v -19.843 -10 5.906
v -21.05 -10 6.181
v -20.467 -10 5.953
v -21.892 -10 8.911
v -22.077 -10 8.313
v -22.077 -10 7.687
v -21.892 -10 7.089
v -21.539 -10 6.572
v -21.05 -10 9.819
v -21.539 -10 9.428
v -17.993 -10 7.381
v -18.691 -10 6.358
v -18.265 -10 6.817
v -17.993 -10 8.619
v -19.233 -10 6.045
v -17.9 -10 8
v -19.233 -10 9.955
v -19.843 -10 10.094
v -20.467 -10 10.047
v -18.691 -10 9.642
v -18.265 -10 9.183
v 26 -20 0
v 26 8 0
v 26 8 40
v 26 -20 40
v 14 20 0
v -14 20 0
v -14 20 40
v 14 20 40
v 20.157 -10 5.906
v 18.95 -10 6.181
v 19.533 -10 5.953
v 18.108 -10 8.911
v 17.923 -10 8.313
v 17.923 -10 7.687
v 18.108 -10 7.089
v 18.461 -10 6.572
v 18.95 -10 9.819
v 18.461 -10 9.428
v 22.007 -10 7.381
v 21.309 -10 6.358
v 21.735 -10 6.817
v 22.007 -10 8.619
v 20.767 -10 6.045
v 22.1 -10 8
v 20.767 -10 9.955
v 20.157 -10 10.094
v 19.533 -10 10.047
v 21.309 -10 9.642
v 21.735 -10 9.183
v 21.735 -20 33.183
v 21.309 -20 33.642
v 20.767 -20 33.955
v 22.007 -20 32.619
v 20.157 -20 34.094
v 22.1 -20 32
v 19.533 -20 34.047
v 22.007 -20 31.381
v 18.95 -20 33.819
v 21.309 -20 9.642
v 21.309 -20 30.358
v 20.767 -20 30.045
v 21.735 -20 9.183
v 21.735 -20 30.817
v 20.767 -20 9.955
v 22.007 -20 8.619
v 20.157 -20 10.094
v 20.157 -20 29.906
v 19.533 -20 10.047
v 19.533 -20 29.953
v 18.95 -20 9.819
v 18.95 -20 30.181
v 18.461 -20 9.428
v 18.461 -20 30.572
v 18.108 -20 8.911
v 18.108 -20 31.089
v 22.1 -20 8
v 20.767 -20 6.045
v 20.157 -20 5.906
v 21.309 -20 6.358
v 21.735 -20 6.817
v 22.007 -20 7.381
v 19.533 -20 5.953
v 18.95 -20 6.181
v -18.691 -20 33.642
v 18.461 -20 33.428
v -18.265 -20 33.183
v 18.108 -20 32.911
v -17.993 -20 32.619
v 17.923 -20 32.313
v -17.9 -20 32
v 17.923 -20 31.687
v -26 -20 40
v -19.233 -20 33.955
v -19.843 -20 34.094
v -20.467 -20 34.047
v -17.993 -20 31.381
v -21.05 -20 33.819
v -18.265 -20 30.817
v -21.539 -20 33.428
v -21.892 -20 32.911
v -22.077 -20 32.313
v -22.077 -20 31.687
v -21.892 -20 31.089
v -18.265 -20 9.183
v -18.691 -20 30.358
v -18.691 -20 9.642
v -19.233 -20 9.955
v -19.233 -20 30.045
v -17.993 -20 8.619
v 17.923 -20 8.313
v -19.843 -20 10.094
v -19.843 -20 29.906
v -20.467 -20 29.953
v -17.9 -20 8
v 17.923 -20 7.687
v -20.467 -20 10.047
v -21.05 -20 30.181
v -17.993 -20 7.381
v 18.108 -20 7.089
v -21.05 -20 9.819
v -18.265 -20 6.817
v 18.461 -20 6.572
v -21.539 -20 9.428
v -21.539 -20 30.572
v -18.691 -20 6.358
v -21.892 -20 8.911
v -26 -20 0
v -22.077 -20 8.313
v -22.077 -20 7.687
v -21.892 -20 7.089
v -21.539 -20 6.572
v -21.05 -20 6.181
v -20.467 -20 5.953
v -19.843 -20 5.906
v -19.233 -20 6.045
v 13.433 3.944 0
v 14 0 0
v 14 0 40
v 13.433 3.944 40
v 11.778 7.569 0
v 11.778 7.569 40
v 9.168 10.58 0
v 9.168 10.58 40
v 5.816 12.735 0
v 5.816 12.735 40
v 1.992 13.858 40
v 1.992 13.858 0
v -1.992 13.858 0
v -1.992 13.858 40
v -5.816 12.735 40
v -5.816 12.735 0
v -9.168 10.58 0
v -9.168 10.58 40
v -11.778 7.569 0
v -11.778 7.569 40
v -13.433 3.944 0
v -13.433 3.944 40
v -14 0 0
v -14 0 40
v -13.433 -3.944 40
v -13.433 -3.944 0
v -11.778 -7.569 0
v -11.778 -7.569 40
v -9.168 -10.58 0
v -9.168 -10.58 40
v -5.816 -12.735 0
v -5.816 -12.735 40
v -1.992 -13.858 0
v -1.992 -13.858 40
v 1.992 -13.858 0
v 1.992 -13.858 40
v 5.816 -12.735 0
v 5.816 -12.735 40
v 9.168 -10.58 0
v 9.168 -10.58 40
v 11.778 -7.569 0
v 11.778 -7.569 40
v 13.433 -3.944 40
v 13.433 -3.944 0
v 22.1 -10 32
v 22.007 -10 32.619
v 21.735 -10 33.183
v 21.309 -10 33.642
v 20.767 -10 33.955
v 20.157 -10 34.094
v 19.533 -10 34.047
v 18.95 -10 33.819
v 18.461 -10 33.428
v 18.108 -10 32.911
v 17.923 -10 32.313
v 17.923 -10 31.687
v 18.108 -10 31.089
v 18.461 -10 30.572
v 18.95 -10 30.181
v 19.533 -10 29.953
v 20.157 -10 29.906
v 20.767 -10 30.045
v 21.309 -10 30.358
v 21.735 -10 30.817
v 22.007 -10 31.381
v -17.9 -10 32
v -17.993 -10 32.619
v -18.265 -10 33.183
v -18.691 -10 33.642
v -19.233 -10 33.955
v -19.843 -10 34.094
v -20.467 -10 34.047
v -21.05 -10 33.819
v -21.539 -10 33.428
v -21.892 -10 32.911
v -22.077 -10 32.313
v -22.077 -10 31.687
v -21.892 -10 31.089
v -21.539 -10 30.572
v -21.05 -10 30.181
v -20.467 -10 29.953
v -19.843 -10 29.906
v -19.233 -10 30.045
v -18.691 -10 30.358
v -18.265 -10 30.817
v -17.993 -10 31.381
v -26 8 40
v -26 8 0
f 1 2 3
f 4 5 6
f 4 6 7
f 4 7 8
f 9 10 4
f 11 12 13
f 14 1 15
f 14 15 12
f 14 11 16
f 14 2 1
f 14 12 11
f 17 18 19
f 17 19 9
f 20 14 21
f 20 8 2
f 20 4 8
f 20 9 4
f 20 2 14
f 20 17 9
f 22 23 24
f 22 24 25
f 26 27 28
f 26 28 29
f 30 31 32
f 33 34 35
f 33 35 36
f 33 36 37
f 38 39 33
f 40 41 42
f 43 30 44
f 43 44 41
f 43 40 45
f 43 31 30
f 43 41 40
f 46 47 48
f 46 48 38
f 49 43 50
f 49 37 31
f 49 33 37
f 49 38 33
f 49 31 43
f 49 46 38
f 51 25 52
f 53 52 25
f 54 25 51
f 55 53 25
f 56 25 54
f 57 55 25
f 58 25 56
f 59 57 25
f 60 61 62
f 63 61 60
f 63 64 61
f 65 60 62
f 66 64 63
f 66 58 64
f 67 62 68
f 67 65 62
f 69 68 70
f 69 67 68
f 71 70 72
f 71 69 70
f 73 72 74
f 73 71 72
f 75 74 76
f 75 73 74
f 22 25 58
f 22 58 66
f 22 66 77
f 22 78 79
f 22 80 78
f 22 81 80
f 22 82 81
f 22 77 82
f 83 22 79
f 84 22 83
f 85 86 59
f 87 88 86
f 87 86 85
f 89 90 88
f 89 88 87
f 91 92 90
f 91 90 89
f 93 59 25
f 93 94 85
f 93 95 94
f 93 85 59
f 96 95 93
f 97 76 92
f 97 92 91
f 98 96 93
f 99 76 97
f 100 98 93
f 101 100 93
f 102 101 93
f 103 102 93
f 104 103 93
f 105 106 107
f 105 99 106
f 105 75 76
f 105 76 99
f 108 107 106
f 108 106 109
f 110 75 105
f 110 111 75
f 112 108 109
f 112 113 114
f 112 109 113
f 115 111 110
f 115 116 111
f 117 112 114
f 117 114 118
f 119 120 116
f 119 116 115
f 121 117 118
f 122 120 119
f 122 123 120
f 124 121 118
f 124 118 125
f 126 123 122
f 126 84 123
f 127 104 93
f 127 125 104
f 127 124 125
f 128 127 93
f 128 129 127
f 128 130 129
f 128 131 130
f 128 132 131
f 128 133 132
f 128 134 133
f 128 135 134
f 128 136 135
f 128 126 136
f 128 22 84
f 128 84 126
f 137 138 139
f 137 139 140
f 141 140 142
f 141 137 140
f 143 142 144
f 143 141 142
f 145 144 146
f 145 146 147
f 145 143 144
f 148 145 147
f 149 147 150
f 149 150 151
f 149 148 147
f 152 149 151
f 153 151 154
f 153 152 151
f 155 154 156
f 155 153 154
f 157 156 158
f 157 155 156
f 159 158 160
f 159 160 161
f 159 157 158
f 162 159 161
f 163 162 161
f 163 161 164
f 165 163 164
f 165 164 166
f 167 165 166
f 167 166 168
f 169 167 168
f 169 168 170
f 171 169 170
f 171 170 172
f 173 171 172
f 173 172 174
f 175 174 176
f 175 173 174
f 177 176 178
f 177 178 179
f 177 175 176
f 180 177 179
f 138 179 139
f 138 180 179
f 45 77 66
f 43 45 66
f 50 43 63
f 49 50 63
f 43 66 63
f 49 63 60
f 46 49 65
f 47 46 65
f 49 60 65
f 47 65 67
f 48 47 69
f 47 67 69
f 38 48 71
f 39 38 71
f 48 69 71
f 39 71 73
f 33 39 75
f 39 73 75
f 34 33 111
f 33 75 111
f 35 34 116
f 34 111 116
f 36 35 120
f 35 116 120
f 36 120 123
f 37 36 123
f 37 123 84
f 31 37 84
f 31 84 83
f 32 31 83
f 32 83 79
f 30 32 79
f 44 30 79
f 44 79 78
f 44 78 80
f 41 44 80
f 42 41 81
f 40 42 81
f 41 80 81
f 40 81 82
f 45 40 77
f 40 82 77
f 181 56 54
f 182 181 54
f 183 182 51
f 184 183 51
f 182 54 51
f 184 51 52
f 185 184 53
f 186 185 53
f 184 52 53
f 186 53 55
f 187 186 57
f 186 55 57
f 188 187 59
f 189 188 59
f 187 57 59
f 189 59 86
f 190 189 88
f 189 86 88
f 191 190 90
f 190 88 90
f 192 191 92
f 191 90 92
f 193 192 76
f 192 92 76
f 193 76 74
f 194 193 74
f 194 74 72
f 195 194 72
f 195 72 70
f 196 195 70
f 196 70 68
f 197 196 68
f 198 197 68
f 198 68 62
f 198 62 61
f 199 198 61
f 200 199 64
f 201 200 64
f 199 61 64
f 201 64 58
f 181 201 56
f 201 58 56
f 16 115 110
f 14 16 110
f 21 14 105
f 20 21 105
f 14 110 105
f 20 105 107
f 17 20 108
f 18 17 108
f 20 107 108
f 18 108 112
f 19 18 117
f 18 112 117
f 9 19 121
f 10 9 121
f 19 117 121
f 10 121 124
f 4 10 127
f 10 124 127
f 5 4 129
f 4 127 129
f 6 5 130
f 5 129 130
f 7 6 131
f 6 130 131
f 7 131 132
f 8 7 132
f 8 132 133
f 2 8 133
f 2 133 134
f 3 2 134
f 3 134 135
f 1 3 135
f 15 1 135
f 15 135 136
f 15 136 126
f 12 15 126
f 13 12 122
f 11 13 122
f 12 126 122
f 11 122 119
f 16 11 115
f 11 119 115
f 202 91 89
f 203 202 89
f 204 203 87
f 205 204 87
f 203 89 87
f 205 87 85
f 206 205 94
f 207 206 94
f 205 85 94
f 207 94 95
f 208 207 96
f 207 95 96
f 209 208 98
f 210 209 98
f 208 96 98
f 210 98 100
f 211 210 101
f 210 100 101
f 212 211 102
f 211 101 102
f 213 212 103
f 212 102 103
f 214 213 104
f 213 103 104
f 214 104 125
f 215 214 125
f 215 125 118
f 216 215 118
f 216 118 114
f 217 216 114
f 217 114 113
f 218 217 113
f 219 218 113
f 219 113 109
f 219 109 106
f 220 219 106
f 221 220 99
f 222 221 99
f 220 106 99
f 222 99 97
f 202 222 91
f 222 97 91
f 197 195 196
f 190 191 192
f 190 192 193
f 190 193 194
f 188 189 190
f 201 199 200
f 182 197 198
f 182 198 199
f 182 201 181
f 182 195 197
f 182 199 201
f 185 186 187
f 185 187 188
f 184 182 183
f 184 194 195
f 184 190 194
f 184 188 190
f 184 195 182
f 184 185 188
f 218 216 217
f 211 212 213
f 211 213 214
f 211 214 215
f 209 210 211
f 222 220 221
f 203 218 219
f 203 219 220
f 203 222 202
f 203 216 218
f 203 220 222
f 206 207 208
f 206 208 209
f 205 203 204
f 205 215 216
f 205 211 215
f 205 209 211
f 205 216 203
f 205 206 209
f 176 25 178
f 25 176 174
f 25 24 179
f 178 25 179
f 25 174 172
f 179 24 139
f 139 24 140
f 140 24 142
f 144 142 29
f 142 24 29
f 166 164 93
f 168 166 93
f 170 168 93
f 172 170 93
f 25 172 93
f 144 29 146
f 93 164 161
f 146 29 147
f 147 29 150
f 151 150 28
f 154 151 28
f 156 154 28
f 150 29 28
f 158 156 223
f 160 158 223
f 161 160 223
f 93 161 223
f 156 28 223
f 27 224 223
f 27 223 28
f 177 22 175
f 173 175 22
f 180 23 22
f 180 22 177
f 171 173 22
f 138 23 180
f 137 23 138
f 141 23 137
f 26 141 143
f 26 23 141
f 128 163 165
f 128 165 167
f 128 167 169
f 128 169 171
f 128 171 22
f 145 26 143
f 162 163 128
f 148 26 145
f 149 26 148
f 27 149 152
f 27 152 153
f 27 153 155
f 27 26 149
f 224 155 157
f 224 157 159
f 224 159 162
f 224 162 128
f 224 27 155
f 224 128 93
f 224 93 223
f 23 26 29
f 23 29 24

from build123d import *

# Parameters (mm, degrees)
SKETCH1_R           = 14
BOSS_EXTRUDE1_DEPTH = 40
SKETCH2_R           = 2.1
CUT_EXTRUDE1_DEPTH  = 10


with BuildPart() as part:
    # Sketch1 → Boss-Extrude1 (new body)
    with BuildSketch(Plane.XY):
        Polygon((-14, 20), (14, 20), (26, 8), (26, -20), (-26, -20), (-26, 8), align=None)
        Circle(SKETCH1_R, mode=Mode.SUBTRACT)
    extrude(amount=BOSS_EXTRUDE1_DEPTH)

    # Sketch2 → Cut-Extrude1 (cut)
    with BuildSketch(Plane.XZ.offset(20)):
        with Locations((-20, 32)):
            Circle(SKETCH2_R)
        with Locations((20, 32)):
            Circle(SKETCH2_R)
        with Locations((20, 8)):
            Circle(SKETCH2_R)
        with Locations((-20, 8)):
            Circle(SKETCH2_R)
    extrude(amount=-CUT_EXTRUDE1_DEPTH, mode=Mode.SUBTRACT)


solid = part.part
